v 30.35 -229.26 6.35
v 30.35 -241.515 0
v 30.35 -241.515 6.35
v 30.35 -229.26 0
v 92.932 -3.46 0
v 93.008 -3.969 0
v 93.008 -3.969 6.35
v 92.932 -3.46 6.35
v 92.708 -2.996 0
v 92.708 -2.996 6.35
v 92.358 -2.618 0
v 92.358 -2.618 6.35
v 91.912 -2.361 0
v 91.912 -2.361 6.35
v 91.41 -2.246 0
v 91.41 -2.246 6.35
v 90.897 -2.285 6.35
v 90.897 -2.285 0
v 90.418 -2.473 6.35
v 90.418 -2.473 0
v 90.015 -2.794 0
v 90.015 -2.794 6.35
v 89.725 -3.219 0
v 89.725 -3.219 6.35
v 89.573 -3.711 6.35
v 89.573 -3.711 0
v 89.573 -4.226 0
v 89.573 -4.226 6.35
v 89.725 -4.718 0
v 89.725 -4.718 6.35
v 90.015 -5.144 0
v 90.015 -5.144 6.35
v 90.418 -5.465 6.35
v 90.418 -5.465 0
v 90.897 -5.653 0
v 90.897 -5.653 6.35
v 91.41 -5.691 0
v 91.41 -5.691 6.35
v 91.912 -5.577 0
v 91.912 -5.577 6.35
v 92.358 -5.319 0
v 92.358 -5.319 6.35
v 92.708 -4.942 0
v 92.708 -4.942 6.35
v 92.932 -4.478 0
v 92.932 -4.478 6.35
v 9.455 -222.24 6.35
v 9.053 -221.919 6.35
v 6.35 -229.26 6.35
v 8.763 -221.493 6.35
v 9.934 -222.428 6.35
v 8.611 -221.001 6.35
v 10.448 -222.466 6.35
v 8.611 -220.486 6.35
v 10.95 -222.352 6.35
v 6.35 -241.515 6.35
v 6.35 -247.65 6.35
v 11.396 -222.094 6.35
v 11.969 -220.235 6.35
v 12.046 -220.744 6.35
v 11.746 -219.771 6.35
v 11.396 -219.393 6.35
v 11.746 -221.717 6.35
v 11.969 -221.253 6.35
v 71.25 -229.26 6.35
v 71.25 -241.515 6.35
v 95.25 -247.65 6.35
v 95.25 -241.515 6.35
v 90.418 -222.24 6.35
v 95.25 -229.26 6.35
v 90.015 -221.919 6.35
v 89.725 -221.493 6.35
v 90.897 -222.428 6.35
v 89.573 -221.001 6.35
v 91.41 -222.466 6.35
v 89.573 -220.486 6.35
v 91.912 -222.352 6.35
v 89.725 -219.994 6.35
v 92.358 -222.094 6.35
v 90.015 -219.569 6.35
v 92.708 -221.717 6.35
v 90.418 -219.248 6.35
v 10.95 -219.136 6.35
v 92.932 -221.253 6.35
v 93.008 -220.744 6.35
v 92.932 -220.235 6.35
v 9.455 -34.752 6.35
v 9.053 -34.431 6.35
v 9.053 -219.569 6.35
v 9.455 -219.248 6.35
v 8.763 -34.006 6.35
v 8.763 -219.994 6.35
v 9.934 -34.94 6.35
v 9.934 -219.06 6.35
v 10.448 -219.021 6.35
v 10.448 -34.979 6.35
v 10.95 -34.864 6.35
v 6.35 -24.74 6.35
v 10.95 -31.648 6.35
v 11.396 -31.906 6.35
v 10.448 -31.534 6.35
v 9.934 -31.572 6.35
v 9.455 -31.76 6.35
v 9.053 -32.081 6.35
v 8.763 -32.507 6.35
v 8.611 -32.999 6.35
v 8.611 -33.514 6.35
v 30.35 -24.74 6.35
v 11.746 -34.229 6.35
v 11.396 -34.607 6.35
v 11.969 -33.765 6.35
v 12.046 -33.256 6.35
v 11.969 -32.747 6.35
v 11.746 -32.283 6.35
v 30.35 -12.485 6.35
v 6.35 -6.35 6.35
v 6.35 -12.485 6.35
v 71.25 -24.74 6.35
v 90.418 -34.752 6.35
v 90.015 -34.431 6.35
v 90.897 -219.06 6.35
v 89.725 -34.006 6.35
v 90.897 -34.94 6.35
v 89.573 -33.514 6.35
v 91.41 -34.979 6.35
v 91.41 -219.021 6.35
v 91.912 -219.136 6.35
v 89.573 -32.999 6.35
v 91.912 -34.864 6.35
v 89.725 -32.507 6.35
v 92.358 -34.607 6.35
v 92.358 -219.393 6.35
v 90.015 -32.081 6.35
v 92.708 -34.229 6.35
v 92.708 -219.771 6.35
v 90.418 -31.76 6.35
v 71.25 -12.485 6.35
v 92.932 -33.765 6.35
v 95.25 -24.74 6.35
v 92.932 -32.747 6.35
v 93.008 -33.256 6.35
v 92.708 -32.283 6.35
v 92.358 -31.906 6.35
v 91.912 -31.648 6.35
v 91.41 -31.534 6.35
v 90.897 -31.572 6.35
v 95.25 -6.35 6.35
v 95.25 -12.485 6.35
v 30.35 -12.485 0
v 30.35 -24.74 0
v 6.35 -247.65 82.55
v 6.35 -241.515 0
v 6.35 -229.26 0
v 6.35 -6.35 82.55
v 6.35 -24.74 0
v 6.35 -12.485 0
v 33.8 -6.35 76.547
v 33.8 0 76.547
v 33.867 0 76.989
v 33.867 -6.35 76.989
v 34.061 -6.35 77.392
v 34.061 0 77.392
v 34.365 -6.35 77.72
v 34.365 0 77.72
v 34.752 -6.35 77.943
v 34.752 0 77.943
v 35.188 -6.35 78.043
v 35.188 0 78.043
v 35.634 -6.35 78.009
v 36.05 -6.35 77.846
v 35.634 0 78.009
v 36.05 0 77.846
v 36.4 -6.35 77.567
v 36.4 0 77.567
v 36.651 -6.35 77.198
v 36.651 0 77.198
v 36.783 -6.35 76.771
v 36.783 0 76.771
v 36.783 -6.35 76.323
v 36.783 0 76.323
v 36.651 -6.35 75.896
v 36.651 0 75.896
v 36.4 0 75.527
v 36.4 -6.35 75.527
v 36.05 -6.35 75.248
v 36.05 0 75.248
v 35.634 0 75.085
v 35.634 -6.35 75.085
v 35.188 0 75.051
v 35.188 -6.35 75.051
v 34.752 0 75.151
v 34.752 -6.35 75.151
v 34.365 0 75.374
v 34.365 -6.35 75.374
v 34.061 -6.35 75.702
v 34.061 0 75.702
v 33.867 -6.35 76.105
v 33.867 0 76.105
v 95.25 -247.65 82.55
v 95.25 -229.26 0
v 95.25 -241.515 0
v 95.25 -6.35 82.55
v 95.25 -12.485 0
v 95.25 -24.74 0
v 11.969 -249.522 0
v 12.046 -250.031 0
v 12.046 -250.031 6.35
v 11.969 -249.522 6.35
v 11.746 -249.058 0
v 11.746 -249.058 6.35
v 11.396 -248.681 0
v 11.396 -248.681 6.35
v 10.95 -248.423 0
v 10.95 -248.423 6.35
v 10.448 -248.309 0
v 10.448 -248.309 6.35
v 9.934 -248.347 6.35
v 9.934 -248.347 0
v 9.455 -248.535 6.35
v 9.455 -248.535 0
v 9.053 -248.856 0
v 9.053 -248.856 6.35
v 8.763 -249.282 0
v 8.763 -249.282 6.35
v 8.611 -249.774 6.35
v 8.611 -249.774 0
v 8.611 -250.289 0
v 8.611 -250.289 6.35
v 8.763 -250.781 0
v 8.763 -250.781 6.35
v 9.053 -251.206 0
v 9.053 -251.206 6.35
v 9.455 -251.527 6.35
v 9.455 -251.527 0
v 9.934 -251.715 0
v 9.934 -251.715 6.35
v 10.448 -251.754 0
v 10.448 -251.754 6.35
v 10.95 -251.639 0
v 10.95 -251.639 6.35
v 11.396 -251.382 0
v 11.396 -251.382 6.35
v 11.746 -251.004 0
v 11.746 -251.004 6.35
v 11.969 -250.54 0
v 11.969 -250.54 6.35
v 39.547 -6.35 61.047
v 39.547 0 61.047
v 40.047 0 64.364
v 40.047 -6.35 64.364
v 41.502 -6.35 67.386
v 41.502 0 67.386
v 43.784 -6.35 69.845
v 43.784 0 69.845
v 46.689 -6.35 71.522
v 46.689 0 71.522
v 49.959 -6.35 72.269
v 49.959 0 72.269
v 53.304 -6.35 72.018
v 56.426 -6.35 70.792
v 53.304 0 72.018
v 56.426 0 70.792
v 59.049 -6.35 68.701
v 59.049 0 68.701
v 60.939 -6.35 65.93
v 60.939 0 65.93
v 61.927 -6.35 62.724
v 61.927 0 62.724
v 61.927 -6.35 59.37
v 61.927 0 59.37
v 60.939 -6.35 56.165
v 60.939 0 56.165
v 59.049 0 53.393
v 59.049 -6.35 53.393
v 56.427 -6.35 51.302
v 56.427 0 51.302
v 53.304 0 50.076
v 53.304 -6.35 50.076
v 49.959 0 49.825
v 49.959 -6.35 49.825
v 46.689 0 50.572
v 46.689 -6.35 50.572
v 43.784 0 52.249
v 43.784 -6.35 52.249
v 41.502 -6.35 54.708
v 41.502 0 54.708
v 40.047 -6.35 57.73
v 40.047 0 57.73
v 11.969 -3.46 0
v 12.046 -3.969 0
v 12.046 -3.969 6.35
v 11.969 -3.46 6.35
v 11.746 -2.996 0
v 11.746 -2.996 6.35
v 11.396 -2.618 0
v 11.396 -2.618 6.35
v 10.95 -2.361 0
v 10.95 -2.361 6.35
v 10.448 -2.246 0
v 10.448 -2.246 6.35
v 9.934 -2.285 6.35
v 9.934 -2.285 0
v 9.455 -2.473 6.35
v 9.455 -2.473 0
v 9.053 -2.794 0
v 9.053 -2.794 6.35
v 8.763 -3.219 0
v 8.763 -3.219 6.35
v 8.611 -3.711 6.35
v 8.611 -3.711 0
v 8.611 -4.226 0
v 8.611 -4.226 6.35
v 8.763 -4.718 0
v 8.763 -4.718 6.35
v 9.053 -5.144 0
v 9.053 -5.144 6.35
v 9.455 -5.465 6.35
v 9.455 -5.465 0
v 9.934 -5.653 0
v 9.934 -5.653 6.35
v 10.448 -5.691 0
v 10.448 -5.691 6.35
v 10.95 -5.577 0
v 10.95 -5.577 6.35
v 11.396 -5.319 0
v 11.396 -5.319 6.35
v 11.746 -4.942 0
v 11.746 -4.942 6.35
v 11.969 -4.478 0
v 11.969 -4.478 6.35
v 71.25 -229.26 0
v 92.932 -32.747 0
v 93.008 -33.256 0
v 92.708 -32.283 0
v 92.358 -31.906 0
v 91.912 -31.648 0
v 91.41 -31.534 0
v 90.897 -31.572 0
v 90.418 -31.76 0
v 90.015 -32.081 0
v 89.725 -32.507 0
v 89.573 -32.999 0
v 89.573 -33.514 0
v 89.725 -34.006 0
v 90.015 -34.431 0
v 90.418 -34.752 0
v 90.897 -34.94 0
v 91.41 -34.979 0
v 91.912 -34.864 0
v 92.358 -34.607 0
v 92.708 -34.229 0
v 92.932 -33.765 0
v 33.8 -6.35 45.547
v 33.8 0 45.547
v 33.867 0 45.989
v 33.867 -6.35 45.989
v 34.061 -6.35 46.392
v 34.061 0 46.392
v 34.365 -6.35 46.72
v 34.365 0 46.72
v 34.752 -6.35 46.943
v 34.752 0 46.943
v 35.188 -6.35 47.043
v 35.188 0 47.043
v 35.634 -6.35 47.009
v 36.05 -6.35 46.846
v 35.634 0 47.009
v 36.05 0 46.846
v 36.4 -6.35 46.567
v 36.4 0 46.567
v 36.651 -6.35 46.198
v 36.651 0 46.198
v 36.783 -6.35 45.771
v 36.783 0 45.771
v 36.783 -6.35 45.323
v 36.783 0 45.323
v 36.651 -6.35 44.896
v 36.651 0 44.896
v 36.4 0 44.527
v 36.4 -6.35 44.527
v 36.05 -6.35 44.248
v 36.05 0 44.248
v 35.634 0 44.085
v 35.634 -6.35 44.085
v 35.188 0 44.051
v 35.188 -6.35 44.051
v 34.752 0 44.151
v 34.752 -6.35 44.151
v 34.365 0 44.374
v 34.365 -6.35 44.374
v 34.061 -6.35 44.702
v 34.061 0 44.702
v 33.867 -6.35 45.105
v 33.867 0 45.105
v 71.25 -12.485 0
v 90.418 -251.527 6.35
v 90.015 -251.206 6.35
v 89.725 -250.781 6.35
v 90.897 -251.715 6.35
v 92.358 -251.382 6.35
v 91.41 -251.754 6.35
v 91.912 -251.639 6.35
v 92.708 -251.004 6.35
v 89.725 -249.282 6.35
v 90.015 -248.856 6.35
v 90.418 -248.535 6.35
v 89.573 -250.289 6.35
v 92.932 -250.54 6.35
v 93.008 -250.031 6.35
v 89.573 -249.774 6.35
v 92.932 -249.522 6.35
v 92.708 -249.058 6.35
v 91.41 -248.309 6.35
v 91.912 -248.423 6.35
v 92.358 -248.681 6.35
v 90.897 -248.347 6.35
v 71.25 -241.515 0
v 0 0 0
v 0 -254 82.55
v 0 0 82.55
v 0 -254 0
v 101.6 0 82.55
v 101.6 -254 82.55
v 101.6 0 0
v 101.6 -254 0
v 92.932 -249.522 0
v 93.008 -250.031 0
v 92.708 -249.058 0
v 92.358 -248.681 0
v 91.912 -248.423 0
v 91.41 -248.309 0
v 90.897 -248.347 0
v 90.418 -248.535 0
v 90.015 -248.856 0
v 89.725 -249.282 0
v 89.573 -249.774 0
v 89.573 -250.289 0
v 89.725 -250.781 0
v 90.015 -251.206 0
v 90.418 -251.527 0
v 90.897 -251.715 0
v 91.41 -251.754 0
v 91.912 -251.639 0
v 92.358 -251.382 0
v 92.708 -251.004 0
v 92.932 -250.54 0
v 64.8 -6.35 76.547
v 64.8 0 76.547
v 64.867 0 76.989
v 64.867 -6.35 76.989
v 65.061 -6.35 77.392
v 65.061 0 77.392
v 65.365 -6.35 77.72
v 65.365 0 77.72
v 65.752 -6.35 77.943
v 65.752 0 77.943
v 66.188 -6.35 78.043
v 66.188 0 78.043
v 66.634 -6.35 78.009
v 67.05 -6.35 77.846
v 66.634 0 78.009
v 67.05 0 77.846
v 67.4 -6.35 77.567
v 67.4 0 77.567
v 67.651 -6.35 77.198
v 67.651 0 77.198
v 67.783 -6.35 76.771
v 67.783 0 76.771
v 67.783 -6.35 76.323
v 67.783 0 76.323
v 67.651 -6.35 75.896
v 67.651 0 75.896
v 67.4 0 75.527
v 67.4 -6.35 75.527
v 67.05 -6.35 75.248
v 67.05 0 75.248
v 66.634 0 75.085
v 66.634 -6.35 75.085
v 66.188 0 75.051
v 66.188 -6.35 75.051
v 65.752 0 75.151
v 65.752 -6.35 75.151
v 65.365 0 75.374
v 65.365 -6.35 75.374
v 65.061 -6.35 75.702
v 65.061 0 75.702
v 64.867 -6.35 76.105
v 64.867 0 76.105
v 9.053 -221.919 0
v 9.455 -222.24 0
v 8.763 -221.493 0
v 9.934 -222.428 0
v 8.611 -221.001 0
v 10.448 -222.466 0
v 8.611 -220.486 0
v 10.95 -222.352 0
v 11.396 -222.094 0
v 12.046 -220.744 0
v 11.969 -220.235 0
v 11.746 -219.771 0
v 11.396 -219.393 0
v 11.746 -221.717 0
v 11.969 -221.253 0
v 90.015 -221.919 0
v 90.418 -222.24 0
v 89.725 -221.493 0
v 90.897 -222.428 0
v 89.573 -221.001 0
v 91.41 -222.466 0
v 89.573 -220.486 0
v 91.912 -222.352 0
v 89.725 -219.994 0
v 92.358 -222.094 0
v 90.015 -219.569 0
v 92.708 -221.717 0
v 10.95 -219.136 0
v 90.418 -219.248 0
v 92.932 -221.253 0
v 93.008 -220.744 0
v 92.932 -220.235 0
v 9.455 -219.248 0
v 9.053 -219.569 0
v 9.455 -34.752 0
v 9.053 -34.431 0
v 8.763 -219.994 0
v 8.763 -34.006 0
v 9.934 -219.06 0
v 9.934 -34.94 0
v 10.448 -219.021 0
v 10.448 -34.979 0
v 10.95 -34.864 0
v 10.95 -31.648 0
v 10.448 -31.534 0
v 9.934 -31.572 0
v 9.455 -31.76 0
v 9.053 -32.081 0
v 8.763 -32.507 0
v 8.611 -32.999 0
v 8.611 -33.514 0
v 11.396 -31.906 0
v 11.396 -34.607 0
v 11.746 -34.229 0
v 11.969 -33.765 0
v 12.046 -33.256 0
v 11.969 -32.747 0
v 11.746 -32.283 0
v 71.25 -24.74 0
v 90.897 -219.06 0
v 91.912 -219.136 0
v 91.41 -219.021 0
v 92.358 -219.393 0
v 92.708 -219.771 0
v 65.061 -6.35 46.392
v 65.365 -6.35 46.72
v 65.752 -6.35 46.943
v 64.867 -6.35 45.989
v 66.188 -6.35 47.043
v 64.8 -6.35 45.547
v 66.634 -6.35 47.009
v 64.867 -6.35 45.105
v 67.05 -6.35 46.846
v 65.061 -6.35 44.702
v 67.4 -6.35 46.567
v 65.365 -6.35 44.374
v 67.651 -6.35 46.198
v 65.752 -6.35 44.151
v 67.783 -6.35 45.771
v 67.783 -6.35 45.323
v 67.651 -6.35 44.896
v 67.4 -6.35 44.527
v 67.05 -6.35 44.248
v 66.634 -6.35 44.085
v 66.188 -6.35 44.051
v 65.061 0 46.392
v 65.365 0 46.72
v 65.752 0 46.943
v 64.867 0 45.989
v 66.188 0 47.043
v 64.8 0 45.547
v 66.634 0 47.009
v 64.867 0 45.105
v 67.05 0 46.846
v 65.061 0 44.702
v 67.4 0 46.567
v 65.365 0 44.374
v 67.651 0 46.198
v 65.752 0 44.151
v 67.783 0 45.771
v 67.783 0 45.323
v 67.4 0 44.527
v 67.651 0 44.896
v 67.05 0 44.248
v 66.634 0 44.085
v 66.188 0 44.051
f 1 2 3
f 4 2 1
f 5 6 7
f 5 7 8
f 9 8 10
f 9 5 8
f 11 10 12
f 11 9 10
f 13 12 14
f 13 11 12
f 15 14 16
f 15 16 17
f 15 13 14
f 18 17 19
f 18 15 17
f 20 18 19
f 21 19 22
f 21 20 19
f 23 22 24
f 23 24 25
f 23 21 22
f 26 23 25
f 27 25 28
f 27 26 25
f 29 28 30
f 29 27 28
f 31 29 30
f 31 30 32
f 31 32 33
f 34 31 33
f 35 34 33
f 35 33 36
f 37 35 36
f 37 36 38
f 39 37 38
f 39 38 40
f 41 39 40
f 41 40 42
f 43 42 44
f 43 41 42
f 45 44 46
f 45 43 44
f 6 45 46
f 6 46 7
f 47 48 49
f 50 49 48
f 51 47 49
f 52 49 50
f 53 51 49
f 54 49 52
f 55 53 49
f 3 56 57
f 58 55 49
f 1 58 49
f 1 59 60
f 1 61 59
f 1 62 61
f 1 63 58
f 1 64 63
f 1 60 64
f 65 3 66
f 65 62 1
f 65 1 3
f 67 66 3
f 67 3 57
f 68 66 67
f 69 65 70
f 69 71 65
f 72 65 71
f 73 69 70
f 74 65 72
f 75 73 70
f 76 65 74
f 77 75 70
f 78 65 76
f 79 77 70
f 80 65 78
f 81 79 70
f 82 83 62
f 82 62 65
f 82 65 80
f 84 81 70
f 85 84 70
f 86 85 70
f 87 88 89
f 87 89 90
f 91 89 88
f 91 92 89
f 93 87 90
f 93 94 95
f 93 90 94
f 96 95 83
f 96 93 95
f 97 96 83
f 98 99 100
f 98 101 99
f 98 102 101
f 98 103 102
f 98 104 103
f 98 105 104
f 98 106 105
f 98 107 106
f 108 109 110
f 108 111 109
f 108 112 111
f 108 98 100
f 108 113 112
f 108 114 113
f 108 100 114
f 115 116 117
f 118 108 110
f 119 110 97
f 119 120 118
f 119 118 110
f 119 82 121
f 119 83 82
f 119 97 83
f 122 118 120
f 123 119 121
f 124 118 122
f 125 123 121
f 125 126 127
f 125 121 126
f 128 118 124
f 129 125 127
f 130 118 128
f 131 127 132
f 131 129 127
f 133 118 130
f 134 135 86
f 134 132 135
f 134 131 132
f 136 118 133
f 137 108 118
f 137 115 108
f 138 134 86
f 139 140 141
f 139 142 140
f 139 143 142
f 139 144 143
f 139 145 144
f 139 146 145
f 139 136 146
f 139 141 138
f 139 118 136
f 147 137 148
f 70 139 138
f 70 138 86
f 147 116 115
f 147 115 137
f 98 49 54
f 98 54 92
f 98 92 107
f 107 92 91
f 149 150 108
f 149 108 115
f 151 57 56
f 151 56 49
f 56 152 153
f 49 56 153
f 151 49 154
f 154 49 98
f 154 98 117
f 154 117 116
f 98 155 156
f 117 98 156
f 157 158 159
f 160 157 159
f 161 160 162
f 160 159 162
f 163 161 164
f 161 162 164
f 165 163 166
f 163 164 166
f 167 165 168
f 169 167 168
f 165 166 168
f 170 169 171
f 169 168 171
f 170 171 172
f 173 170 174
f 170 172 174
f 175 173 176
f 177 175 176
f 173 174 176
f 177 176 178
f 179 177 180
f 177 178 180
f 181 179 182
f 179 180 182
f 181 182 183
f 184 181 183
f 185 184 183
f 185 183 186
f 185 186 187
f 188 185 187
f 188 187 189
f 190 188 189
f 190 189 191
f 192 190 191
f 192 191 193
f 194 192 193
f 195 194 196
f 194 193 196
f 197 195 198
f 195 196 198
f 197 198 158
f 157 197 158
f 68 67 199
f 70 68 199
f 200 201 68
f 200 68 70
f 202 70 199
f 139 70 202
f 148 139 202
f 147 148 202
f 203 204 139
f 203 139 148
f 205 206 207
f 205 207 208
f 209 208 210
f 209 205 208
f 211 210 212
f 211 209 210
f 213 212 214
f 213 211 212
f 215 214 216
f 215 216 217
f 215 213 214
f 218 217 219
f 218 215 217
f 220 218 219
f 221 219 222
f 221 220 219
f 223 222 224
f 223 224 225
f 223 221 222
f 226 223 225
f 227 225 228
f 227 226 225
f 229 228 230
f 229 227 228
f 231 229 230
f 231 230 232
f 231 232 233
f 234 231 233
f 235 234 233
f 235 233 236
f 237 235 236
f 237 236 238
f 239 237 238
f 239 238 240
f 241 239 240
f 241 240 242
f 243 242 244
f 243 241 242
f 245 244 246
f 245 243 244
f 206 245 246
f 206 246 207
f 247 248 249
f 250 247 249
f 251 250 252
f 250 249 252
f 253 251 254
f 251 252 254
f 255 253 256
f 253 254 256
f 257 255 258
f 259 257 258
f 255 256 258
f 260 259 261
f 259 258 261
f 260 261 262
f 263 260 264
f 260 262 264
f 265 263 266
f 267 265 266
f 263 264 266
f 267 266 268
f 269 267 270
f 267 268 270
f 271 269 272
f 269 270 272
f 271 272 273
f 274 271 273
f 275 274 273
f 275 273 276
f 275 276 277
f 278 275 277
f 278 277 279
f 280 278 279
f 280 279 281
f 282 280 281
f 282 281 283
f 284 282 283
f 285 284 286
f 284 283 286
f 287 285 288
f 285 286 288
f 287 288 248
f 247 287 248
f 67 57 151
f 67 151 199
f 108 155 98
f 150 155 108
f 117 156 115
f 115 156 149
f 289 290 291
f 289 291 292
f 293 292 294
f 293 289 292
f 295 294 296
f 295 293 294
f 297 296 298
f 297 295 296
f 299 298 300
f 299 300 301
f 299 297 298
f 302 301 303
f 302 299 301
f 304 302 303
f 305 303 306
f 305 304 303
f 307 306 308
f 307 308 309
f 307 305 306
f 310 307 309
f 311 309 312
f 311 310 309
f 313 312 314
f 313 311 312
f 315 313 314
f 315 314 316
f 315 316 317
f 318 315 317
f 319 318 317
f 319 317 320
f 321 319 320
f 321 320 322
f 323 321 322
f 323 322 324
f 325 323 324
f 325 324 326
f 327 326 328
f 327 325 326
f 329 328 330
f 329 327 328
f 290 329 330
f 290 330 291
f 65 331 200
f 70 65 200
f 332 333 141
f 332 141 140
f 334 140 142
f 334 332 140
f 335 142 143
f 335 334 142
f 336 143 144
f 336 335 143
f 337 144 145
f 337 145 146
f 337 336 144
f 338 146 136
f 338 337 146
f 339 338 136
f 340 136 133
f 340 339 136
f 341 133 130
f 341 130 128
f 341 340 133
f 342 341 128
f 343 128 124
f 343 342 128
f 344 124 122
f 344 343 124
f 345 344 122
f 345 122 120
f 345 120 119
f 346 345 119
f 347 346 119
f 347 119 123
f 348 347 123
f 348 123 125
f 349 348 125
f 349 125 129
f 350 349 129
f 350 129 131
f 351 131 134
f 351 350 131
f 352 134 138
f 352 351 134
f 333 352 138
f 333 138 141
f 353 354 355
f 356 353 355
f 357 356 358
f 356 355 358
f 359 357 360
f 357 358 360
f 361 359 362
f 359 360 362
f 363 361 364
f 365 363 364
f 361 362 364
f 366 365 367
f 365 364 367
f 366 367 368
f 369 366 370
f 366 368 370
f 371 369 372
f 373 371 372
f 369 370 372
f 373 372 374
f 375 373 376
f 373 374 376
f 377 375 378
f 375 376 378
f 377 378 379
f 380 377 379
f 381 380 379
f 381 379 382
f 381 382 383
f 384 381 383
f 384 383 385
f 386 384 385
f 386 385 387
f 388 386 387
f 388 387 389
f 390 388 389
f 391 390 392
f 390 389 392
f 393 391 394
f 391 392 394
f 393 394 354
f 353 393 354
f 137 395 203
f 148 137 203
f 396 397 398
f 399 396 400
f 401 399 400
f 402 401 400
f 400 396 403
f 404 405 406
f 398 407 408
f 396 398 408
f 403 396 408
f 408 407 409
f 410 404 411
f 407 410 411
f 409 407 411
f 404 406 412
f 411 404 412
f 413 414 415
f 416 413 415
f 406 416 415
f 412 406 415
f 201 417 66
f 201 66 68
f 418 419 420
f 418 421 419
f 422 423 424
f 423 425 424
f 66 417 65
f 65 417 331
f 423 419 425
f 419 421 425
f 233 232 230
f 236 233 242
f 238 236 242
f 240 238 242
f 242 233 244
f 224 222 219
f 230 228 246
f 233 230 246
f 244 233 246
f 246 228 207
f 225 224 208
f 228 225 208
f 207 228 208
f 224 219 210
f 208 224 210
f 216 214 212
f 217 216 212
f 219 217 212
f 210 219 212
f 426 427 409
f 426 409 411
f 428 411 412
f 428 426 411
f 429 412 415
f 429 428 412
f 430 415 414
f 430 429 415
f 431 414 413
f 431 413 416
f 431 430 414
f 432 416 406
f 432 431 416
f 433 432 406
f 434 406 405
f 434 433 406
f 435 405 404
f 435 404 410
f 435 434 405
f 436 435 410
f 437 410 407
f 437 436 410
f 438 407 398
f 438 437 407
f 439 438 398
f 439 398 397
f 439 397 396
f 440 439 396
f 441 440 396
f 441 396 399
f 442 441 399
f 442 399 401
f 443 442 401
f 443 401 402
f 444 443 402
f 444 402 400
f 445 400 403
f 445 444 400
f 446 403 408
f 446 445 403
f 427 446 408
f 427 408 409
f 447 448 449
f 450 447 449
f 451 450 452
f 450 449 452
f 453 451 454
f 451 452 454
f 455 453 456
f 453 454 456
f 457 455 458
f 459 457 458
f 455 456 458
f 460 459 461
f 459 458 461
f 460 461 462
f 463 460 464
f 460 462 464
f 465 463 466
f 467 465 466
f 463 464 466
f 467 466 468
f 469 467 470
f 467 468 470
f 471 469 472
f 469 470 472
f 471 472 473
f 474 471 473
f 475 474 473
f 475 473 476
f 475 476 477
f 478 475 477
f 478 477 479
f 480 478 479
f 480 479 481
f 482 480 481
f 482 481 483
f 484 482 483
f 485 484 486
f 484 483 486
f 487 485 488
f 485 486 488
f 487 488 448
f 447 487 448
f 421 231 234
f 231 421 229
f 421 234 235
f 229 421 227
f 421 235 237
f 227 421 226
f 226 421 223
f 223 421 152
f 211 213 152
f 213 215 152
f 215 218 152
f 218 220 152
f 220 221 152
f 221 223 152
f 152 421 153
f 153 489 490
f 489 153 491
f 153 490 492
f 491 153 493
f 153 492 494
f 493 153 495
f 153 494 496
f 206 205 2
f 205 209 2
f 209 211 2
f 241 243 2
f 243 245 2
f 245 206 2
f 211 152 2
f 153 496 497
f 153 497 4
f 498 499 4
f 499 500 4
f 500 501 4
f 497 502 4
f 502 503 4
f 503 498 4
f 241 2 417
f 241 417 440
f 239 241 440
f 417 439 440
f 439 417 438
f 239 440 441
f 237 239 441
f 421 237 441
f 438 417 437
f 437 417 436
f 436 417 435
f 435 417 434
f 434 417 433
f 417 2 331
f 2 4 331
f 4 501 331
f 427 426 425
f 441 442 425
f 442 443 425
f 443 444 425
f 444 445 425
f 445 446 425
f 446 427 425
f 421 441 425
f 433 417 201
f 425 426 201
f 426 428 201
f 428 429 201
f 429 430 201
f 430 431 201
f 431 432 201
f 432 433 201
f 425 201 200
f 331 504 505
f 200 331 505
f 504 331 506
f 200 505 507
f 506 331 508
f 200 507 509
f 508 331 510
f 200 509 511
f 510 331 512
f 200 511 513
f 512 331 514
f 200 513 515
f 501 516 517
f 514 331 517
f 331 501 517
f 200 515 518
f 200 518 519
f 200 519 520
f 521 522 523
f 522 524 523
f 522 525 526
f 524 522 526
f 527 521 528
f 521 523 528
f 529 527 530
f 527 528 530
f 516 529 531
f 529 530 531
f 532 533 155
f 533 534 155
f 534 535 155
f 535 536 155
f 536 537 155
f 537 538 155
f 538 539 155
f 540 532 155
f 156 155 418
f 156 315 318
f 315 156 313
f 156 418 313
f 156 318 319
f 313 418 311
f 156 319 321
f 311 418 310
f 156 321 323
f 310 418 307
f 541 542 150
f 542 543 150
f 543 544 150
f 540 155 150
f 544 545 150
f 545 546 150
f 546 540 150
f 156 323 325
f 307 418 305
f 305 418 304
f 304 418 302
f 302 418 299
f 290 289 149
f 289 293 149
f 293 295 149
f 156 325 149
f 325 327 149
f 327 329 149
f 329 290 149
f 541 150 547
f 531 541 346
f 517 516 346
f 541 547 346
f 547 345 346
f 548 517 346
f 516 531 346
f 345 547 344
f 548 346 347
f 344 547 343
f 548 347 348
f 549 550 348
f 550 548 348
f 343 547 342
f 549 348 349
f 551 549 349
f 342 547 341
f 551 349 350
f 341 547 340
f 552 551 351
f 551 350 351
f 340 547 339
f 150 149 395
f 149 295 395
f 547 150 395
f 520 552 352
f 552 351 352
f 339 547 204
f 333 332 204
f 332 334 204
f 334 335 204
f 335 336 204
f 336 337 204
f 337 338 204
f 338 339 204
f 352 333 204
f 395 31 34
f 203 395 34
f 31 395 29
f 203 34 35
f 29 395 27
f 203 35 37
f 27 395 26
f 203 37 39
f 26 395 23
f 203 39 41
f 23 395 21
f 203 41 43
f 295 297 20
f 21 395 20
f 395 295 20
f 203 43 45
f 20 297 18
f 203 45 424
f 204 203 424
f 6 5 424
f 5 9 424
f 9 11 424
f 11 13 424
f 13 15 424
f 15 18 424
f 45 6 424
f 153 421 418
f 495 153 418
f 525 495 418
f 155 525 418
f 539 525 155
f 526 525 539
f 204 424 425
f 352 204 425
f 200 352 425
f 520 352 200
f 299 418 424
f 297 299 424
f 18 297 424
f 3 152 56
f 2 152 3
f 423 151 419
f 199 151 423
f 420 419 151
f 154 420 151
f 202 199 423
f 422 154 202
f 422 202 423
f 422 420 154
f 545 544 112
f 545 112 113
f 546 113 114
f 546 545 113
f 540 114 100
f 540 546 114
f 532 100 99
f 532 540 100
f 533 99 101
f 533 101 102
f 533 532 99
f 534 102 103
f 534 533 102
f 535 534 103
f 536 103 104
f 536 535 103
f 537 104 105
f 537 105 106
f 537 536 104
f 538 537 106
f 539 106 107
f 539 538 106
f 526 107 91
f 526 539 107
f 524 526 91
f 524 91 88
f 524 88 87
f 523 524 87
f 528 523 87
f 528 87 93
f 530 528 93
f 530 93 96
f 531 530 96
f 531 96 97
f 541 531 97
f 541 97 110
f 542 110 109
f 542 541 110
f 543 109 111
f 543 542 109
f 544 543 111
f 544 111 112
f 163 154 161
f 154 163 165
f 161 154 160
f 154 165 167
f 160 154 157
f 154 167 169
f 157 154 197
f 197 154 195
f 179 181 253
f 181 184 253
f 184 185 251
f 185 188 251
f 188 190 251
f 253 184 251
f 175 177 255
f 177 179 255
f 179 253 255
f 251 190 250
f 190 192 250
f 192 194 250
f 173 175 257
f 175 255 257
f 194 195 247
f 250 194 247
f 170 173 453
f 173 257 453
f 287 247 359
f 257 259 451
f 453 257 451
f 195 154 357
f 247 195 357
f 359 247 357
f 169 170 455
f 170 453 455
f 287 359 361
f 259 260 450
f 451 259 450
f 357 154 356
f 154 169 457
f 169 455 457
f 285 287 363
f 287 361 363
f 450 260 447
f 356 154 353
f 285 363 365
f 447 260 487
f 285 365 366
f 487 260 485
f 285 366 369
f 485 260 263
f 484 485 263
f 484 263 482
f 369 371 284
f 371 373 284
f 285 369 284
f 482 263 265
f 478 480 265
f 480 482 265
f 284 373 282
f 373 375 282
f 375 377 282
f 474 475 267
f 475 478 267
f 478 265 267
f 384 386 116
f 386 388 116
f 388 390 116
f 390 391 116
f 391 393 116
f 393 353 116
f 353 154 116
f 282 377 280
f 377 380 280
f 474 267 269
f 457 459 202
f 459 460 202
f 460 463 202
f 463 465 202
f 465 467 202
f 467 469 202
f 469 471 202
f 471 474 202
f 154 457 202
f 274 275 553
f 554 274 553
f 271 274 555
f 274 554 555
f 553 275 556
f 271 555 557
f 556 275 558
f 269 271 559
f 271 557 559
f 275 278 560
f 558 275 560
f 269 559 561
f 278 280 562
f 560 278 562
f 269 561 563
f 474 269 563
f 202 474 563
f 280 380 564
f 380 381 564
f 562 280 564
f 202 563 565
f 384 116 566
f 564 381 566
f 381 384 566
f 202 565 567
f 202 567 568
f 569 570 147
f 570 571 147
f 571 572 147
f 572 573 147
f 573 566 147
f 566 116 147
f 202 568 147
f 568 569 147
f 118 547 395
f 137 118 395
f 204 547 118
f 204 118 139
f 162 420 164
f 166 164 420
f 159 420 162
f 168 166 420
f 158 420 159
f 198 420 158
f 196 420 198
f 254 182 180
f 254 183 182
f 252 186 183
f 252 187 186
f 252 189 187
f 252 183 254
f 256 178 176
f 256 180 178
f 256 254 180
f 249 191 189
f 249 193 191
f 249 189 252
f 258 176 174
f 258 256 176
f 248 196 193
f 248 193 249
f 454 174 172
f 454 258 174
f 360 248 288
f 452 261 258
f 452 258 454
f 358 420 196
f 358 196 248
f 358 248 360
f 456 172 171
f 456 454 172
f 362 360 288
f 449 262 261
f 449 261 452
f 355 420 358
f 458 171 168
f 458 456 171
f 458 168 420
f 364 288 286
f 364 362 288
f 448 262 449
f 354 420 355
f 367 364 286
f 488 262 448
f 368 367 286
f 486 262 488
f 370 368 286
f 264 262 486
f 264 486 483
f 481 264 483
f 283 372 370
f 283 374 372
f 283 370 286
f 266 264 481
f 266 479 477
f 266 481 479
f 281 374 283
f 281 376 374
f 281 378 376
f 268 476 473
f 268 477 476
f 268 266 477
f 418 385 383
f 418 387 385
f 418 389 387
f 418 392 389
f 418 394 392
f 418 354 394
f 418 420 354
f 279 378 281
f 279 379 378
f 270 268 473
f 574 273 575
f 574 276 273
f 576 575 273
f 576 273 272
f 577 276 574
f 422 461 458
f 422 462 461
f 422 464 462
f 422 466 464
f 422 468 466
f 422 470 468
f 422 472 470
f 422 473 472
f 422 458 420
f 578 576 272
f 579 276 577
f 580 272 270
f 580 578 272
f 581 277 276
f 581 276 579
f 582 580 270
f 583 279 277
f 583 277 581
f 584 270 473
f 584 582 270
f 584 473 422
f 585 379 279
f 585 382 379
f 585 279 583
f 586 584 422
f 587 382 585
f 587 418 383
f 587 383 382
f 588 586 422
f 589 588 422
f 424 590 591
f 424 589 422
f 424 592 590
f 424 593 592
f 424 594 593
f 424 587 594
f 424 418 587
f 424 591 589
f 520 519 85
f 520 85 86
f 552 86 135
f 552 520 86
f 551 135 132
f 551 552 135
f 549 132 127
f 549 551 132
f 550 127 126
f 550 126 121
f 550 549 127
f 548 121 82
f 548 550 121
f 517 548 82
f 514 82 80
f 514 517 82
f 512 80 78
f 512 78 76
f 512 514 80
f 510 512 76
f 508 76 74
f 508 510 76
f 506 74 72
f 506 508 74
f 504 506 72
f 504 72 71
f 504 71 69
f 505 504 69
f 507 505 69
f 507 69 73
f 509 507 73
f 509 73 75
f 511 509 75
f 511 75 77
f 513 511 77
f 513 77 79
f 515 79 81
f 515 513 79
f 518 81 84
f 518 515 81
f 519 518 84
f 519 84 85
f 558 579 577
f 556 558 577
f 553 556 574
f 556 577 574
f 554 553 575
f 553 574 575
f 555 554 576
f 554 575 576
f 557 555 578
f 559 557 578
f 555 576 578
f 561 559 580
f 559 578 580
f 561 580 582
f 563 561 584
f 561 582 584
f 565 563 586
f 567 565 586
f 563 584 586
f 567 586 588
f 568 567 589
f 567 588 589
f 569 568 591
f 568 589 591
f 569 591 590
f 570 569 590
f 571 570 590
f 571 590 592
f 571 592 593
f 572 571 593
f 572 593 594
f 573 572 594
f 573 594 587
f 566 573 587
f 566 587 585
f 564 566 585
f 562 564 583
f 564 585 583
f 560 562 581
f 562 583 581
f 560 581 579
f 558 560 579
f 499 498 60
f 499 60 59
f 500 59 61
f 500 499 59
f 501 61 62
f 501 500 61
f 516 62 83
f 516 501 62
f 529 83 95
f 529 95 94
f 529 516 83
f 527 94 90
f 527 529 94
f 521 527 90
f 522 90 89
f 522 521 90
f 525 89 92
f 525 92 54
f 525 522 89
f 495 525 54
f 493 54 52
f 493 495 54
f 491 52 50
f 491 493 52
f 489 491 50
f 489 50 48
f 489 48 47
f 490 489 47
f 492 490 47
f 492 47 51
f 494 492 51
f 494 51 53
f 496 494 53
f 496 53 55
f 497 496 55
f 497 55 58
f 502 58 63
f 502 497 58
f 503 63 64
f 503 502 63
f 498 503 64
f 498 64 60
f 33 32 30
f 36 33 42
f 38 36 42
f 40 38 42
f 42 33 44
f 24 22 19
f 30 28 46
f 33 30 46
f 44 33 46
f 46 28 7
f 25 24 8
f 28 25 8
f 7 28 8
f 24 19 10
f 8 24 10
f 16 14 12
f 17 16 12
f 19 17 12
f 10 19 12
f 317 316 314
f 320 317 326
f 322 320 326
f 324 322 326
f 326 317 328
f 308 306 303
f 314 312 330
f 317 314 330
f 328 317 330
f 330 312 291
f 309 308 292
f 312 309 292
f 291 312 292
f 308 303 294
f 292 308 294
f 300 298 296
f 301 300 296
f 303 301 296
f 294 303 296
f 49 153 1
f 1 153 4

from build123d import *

# Parameters (mm, degrees)
F0_W     = 101.6
F0_H     = 254
F0_R     = 1.7272
F0_W_2   = 24
F0_H_2   = 12.254687
F1_DEPTH = 6.35
F2_W     = 101.6
F2_H     = 254
F2_W_2   = 88.9
F2_H_2   = 241.3
F3_DEPTH = 76.2
F4_R     = 1.5
F4_R_2   = 11.253
F5_DEPTH = 6.35
F6_DEPTH = 6.35


with BuildPart() as f1:
    # F0 (on Top) → F1 (new body)
    with BuildSketch(Plane.XY):
        with Locations((50.8, -127)):
            Rectangle(F0_W, F0_H)
        with Locations((10.31875, -250.03125)):
            Circle(F0_R, mode=Mode.SUBTRACT)
        with Locations((18.35, -235.387502)):
            Rectangle(F0_W_2, F0_H_2, mode=Mode.SUBTRACT)
        with Locations((10.31875, -220.743755)):
            Circle(F0_R, mode=Mode.SUBTRACT)
        with Locations((83.25, -235.387502)):
            Rectangle(F0_W_2, F0_H_2, mode=Mode.SUBTRACT)
        with Locations((91.28125, -250.03125)):
            Circle(F0_R, mode=Mode.SUBTRACT)
        with Locations((91.28125, -220.743755)):
            Circle(F0_R, mode=Mode.SUBTRACT)
        with Locations((10.31875, -33.256245)):
            Circle(F0_R, mode=Mode.SUBTRACT)
        with Locations((10.31875, -3.96875)):
            Circle(F0_R, mode=Mode.SUBTRACT)
        with Locations((18.35, -18.612497)):
            Rectangle(F0_W_2, F0_H_2, mode=Mode.SUBTRACT)
        with Locations((91.28125, -33.256245)):
            Circle(F0_R, mode=Mode.SUBTRACT)
        with Locations((83.25, -18.612497)):
            Rectangle(F0_W_2, F0_H_2, mode=Mode.SUBTRACT)
        with Locations((91.28125, -3.96875)):
            Circle(F0_R, mode=Mode.SUBTRACT)
    extrude(amount=F1_DEPTH)

    # F2 (on face) → F3 (join)
    with BuildSketch(Plane.XY.offset(6.35)):
        with Locations((50.8, -127)):
            Rectangle(F2_W, F2_H)
        with Locations((50.8, -127)):
            Rectangle(F2_W_2, F2_H_2, mode=Mode.SUBTRACT)
    extrude(amount=F3_DEPTH)

    # F4 (on face) → F5 (cut, through all)
    with BuildSketch(Plane(origin=(0, 0, 0), x_dir=(-1, 0, 0), z_dir=(0, 1, 0))):
        with Locations((-66.299994, 76.547002)):
            Circle(F4_R)
        with Locations((-35.300006, 76.547002)):
            Circle(F4_R)
        with Locations((-66.299994, 45.547013)):
            Circle(F4_R)
        with Locations((-50.8, 61.047008)):
            Circle(F4_R_2)
        with Locations((-35.300006, 45.547013)):
            Circle(F4_R)
    extrude(amount=-F5_DEPTH, mode=Mode.SUBTRACT)

    # F4 (on face) → F6 (cut, through all)
    with BuildSketch(Plane(origin=(0, 0, 0), x_dir=(-1, 0, 0), z_dir=(0, 1, 0))):
        with Locations((-66.299994, 76.547002)):
            Circle(F4_R)
        with Locations((-35.300006, 76.547002)):
            Circle(F4_R)
        with Locations((-66.299994, 45.547013)):
            Circle(F4_R)
        with Locations((-50.8, 61.047008)):
            Circle(F4_R_2)
        with Locations((-35.300006, 45.547013)):
            Circle(F4_R)
    extrude(amount=-F6_DEPTH, mode=Mode.SUBTRACT)


solid = f1.part
